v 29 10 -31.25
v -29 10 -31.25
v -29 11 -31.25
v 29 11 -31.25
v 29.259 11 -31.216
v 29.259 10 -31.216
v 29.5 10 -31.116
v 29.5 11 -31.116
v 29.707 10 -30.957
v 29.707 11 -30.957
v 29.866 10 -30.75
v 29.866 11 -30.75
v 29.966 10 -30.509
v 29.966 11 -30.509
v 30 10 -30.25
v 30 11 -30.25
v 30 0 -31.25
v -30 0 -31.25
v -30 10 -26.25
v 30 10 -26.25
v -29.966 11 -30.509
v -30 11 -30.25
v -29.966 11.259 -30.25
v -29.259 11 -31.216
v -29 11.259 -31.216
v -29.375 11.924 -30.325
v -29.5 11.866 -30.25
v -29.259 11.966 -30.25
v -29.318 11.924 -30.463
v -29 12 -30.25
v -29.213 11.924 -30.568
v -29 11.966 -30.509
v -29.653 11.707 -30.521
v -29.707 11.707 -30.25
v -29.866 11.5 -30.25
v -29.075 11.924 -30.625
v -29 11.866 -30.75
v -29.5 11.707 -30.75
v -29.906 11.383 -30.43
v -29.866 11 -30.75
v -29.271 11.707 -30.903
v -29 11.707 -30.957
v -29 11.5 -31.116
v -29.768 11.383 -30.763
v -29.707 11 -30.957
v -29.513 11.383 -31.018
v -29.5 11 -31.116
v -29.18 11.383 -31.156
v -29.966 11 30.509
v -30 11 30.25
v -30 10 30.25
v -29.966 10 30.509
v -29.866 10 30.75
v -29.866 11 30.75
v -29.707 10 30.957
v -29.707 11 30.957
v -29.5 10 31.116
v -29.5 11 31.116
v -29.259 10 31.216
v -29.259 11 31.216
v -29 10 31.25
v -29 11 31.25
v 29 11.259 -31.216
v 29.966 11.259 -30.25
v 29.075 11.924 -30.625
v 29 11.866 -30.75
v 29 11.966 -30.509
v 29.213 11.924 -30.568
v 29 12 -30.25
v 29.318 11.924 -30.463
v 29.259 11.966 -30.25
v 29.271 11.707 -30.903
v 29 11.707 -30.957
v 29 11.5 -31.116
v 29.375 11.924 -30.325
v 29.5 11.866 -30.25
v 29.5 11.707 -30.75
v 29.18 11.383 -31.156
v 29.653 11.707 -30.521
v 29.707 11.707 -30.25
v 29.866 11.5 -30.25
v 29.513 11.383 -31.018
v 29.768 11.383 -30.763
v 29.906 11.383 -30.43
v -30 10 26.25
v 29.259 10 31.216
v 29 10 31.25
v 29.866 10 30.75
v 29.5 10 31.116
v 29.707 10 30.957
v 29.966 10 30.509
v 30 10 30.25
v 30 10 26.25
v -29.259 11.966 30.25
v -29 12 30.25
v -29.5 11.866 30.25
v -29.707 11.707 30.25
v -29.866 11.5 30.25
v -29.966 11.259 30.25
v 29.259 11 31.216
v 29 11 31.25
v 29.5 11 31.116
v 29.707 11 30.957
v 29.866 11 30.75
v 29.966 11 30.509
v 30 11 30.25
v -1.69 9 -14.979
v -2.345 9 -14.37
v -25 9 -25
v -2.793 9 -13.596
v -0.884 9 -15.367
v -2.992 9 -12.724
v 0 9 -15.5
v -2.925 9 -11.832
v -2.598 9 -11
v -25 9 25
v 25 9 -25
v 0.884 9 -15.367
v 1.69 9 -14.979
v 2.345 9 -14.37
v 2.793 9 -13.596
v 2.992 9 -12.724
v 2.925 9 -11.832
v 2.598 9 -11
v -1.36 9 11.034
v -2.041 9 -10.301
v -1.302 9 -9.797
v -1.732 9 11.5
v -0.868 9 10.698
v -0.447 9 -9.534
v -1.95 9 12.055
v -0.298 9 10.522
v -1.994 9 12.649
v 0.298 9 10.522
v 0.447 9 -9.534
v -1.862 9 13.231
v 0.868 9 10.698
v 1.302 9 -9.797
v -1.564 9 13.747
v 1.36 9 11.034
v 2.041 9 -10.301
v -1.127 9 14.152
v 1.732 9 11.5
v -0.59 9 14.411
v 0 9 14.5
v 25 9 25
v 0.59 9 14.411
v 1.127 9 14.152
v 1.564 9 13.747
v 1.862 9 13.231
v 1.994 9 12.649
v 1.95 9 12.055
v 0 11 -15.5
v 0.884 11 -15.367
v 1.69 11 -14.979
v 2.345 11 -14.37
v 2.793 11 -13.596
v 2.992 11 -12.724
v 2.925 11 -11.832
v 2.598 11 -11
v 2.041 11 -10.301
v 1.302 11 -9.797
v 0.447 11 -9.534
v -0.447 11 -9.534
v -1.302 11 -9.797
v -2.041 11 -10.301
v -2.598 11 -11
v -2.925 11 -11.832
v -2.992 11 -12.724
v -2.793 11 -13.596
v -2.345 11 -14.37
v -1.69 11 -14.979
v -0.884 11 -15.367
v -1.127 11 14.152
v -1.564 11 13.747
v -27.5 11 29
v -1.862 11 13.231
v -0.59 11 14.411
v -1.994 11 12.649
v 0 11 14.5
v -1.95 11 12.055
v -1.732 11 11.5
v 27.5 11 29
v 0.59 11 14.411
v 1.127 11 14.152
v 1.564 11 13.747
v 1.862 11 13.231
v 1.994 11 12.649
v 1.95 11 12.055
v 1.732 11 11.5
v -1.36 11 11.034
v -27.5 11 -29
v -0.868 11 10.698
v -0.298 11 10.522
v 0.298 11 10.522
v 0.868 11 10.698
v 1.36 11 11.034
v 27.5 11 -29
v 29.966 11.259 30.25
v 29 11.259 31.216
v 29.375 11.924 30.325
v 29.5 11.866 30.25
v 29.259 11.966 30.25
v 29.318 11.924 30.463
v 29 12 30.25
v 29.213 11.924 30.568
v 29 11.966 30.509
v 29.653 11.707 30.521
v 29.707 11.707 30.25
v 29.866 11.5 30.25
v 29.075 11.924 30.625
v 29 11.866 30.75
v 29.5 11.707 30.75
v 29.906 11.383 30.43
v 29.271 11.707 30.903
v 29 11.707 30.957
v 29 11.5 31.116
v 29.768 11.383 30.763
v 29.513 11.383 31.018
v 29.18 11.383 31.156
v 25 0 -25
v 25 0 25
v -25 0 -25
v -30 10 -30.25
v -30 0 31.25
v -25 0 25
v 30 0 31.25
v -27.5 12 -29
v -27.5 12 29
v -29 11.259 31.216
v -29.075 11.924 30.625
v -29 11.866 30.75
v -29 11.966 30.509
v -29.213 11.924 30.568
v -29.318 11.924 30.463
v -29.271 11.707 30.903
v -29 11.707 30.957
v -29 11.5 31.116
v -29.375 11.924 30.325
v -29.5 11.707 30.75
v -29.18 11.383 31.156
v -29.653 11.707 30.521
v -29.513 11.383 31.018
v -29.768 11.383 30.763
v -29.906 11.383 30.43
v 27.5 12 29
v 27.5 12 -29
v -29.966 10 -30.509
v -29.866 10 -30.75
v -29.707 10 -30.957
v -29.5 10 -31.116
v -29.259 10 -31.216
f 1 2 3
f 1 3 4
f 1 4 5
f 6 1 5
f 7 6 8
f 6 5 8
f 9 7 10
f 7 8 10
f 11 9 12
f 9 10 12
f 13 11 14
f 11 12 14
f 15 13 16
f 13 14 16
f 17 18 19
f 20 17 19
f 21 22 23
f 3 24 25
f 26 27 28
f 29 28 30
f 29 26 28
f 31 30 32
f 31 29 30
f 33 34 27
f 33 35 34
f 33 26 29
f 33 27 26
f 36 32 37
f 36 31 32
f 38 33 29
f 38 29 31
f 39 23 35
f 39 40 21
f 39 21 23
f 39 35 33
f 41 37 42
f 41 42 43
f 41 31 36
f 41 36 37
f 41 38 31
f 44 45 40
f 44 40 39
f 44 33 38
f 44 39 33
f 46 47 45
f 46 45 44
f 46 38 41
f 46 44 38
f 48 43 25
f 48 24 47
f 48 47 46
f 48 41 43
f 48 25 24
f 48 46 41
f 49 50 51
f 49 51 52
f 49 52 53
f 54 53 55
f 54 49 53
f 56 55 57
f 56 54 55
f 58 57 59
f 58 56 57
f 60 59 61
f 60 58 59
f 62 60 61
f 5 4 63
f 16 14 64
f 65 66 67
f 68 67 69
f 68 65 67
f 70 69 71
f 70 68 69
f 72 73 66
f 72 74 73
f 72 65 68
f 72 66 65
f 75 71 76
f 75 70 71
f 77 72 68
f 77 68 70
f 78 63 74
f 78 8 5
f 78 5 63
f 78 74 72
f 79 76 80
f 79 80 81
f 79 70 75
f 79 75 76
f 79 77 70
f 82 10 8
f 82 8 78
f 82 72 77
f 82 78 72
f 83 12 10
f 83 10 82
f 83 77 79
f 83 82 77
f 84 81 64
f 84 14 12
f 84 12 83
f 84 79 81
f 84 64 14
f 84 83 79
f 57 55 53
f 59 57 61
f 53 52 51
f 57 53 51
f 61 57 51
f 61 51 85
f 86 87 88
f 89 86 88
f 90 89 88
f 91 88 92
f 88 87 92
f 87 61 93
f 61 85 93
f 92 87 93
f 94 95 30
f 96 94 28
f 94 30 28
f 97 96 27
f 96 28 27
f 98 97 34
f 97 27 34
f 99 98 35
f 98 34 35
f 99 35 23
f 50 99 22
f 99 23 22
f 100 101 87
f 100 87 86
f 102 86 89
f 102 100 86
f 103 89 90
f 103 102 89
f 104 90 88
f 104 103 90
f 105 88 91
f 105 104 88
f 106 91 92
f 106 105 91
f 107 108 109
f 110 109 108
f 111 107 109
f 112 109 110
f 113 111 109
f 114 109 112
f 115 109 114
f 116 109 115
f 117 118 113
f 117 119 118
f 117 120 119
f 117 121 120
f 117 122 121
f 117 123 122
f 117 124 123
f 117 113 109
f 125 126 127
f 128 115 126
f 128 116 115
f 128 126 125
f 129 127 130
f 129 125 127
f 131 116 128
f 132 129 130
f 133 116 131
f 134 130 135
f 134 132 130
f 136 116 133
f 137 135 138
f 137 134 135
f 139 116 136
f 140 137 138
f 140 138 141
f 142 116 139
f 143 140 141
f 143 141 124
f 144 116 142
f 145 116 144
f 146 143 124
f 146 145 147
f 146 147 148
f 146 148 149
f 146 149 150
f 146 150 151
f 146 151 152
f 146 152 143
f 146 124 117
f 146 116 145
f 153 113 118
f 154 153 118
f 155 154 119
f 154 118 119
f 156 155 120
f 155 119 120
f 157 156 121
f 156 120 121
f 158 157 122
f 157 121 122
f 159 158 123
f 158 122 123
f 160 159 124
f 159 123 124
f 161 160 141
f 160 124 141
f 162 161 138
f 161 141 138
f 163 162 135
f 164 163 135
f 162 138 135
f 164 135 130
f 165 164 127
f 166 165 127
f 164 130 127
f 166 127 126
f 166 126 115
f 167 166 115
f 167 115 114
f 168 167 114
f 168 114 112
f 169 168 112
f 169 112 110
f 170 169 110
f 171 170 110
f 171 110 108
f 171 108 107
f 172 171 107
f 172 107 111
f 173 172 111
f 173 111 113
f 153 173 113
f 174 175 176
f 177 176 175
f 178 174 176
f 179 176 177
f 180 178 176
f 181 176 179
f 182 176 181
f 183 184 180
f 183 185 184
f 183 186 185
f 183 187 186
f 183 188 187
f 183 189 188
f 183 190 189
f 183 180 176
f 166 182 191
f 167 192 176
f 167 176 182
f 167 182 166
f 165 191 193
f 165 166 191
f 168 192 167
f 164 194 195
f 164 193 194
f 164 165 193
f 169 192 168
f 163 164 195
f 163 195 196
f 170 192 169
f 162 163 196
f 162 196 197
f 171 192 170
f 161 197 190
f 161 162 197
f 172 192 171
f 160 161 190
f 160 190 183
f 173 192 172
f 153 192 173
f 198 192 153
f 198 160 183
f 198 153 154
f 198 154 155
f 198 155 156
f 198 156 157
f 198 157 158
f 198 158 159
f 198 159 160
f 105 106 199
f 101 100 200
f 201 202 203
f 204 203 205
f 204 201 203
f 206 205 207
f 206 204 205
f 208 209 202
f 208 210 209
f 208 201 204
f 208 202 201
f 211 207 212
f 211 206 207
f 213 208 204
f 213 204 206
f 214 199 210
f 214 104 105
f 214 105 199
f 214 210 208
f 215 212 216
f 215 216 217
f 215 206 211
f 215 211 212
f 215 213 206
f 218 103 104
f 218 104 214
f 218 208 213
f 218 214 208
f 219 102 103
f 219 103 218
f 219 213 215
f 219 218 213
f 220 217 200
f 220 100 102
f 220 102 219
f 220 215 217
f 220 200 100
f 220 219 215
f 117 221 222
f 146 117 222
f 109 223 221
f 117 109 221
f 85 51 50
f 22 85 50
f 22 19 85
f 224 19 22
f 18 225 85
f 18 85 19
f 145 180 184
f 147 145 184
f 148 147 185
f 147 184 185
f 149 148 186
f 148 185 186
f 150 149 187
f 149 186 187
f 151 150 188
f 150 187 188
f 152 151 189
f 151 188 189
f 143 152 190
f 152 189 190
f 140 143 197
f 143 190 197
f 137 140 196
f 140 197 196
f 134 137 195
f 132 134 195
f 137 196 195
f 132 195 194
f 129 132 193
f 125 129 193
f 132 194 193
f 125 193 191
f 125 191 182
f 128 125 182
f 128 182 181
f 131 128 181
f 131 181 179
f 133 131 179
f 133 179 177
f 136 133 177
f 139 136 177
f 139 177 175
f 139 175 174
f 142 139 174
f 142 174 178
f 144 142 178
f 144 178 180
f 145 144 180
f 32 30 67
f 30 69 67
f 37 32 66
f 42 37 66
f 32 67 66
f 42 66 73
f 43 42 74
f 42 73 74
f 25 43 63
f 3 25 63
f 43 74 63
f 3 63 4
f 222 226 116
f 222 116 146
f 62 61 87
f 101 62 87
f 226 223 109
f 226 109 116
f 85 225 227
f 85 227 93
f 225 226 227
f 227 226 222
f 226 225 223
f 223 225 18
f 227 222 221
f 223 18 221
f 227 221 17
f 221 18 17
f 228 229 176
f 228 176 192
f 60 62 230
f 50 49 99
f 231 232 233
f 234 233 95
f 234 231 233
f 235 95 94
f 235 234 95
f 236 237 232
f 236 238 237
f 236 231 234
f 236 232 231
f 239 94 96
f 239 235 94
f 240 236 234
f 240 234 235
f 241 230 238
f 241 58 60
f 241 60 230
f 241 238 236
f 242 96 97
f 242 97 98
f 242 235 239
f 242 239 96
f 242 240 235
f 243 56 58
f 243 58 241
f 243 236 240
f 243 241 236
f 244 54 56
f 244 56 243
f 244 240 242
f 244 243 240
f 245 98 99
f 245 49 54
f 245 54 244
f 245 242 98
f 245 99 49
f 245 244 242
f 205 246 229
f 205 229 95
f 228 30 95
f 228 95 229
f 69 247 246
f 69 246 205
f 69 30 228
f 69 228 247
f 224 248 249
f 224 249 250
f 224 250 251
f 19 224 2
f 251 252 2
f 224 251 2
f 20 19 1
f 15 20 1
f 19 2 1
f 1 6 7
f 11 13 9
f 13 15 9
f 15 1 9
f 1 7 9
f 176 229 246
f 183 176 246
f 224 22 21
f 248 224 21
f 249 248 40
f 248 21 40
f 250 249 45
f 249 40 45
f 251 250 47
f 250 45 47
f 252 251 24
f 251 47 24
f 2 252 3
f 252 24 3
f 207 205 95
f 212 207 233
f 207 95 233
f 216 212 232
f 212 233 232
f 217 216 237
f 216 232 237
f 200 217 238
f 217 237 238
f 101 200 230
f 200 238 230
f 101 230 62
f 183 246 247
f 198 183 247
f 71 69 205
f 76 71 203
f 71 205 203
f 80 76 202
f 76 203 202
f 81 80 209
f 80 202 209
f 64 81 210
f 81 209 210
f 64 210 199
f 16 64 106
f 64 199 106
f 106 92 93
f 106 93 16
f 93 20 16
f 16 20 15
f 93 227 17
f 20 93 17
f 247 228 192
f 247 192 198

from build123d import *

# Parameters (mm, degrees)
SKETCH1_W           = 60
SKETCH1_H           = 62.5
BOSS_EXTRUDE1_DEPTH = 10
CUT_EXTRUDE1_DEPTH  = 69.385396833
CUT_EXTRUDE2_DEPTH  = 69.385396833
SKETCH4_W           = 60
SKETCH4_H           = 62.5
BOSS_EXTRUDE2_DEPTH = 2
FILLET1_R           = 1
FILLET2_R           = 1
SKETCH5_W           = 55
SKETCH5_H           = 58
CUT_EXTRUDE3_DEPTH  = 1
SKETCH6_W           = 50
SKETCH6_H           = 50
CUT_EXTRUDE4_DEPTH  = 9
SKETCH7_R           = 3
CUT_EXTRUDE5_DEPTH  = 9
SKETCH8_R           = 2
CUT_EXTRUDE6_DEPTH  = 10


with BuildPart() as part:
    # Sketch1 → Boss-Extrude1 (new body)
    with BuildSketch(Plane(origin=(0, 0, 0), x_dir=(1, 0, 0), z_dir=(0, 1, 0))):
        Rectangle(SKETCH1_W, SKETCH1_H)
    extrude(amount=BOSS_EXTRUDE1_DEPTH)

    # Sketch2 → Cut-Extrude1 (cut, through all)
    with BuildSketch(Plane(origin=(30, 0, 0), x_dir=(0, 0, -1), z_dir=(1, 0, 0))):
        Polygon((31.25, 0), (26.25, 10), (31.25, 10), align=None)
    extrude(amount=-CUT_EXTRUDE1_DEPTH, mode=Mode.SUBTRACT)

    # Sketch3 → Cut-Extrude2 (cut, through all)
    with BuildSketch(Plane(origin=(30, 0, 0), x_dir=(0, 0, -1), z_dir=(1, 0, 0))):
        Polygon((-31.25, 0), (-26.25, 10), (-31.25, 10), align=None)
    extrude(amount=-CUT_EXTRUDE2_DEPTH, mode=Mode.SUBTRACT)

    # Sketch4 → Boss-Extrude2 (add)
    with BuildSketch(Plane(origin=(0, 10, 0), x_dir=(1, 0, 0), z_dir=(0, 1, 0))):
        Rectangle(SKETCH4_W, SKETCH4_H)
    extrude(amount=BOSS_EXTRUDE2_DEPTH)

    # Fillet1
    fillet1_edges = [part.edges().sort_by_distance(p)[0] for p in [
        (-30, 11, 31.25),
        (30, 11, 31.25),
        (30, 11, -31.25),
        (-30, 11, -31.25),
    ]]
    fillet(fillet1_edges, radius=FILLET1_R)

    # Fillet2
    fillet2_edges = [part.edges().sort_by_distance(p)[0] for p in [
        (0, 12, -31.25),
        (30, 12, 0),
        (0, 12, 31.25),
        (-30, 12, 0),
        (29.707106781, 12, 30.957106781),
        (-29.707106781, 12, 30.957106781),
        (-29.707106781, 12, -30.957106781),
        (29.707106781, 12, -30.957106781),
    ]]
    fillet(fillet2_edges, radius=FILLET2_R)

    # Sketch5 → Cut-Extrude3 (cut)
    with BuildSketch(Plane(origin=(0, 12, 0), x_dir=(1, 0, 0), z_dir=(0, 1, 0))):
        Rectangle(SKETCH5_W, SKETCH5_H)
    extrude(amount=-CUT_EXTRUDE3_DEPTH, mode=Mode.SUBTRACT)

    # Sketch6 → Cut-Extrude4 (cut)
    with BuildSketch(Plane.XZ):
        Rectangle(SKETCH6_W, SKETCH6_H)
    extrude(amount=-CUT_EXTRUDE4_DEPTH, mode=Mode.SUBTRACT)

    # Sketch7 → Cut-Extrude5 (cut)
    with BuildSketch(Plane.XZ.offset(-9)):
        with Locations(Location((0, -12.5, 0), (0, 0, 270))):
            Circle(SKETCH7_R)
    extrude(amount=-CUT_EXTRUDE5_DEPTH, mode=Mode.SUBTRACT)

    # Sketch8 → Cut-Extrude6 (cut)
    with BuildSketch(Plane(origin=(0, 11, 0), x_dir=(1, 0, 0), z_dir=(0, 1, 0))):
        with Locations(Location((0, -12.5, 0), (0, 0, 270))):
            Circle(SKETCH8_R)
    extrude(amount=-CUT_EXTRUDE6_DEPTH, mode=Mode.SUBTRACT)


solid = part.part
